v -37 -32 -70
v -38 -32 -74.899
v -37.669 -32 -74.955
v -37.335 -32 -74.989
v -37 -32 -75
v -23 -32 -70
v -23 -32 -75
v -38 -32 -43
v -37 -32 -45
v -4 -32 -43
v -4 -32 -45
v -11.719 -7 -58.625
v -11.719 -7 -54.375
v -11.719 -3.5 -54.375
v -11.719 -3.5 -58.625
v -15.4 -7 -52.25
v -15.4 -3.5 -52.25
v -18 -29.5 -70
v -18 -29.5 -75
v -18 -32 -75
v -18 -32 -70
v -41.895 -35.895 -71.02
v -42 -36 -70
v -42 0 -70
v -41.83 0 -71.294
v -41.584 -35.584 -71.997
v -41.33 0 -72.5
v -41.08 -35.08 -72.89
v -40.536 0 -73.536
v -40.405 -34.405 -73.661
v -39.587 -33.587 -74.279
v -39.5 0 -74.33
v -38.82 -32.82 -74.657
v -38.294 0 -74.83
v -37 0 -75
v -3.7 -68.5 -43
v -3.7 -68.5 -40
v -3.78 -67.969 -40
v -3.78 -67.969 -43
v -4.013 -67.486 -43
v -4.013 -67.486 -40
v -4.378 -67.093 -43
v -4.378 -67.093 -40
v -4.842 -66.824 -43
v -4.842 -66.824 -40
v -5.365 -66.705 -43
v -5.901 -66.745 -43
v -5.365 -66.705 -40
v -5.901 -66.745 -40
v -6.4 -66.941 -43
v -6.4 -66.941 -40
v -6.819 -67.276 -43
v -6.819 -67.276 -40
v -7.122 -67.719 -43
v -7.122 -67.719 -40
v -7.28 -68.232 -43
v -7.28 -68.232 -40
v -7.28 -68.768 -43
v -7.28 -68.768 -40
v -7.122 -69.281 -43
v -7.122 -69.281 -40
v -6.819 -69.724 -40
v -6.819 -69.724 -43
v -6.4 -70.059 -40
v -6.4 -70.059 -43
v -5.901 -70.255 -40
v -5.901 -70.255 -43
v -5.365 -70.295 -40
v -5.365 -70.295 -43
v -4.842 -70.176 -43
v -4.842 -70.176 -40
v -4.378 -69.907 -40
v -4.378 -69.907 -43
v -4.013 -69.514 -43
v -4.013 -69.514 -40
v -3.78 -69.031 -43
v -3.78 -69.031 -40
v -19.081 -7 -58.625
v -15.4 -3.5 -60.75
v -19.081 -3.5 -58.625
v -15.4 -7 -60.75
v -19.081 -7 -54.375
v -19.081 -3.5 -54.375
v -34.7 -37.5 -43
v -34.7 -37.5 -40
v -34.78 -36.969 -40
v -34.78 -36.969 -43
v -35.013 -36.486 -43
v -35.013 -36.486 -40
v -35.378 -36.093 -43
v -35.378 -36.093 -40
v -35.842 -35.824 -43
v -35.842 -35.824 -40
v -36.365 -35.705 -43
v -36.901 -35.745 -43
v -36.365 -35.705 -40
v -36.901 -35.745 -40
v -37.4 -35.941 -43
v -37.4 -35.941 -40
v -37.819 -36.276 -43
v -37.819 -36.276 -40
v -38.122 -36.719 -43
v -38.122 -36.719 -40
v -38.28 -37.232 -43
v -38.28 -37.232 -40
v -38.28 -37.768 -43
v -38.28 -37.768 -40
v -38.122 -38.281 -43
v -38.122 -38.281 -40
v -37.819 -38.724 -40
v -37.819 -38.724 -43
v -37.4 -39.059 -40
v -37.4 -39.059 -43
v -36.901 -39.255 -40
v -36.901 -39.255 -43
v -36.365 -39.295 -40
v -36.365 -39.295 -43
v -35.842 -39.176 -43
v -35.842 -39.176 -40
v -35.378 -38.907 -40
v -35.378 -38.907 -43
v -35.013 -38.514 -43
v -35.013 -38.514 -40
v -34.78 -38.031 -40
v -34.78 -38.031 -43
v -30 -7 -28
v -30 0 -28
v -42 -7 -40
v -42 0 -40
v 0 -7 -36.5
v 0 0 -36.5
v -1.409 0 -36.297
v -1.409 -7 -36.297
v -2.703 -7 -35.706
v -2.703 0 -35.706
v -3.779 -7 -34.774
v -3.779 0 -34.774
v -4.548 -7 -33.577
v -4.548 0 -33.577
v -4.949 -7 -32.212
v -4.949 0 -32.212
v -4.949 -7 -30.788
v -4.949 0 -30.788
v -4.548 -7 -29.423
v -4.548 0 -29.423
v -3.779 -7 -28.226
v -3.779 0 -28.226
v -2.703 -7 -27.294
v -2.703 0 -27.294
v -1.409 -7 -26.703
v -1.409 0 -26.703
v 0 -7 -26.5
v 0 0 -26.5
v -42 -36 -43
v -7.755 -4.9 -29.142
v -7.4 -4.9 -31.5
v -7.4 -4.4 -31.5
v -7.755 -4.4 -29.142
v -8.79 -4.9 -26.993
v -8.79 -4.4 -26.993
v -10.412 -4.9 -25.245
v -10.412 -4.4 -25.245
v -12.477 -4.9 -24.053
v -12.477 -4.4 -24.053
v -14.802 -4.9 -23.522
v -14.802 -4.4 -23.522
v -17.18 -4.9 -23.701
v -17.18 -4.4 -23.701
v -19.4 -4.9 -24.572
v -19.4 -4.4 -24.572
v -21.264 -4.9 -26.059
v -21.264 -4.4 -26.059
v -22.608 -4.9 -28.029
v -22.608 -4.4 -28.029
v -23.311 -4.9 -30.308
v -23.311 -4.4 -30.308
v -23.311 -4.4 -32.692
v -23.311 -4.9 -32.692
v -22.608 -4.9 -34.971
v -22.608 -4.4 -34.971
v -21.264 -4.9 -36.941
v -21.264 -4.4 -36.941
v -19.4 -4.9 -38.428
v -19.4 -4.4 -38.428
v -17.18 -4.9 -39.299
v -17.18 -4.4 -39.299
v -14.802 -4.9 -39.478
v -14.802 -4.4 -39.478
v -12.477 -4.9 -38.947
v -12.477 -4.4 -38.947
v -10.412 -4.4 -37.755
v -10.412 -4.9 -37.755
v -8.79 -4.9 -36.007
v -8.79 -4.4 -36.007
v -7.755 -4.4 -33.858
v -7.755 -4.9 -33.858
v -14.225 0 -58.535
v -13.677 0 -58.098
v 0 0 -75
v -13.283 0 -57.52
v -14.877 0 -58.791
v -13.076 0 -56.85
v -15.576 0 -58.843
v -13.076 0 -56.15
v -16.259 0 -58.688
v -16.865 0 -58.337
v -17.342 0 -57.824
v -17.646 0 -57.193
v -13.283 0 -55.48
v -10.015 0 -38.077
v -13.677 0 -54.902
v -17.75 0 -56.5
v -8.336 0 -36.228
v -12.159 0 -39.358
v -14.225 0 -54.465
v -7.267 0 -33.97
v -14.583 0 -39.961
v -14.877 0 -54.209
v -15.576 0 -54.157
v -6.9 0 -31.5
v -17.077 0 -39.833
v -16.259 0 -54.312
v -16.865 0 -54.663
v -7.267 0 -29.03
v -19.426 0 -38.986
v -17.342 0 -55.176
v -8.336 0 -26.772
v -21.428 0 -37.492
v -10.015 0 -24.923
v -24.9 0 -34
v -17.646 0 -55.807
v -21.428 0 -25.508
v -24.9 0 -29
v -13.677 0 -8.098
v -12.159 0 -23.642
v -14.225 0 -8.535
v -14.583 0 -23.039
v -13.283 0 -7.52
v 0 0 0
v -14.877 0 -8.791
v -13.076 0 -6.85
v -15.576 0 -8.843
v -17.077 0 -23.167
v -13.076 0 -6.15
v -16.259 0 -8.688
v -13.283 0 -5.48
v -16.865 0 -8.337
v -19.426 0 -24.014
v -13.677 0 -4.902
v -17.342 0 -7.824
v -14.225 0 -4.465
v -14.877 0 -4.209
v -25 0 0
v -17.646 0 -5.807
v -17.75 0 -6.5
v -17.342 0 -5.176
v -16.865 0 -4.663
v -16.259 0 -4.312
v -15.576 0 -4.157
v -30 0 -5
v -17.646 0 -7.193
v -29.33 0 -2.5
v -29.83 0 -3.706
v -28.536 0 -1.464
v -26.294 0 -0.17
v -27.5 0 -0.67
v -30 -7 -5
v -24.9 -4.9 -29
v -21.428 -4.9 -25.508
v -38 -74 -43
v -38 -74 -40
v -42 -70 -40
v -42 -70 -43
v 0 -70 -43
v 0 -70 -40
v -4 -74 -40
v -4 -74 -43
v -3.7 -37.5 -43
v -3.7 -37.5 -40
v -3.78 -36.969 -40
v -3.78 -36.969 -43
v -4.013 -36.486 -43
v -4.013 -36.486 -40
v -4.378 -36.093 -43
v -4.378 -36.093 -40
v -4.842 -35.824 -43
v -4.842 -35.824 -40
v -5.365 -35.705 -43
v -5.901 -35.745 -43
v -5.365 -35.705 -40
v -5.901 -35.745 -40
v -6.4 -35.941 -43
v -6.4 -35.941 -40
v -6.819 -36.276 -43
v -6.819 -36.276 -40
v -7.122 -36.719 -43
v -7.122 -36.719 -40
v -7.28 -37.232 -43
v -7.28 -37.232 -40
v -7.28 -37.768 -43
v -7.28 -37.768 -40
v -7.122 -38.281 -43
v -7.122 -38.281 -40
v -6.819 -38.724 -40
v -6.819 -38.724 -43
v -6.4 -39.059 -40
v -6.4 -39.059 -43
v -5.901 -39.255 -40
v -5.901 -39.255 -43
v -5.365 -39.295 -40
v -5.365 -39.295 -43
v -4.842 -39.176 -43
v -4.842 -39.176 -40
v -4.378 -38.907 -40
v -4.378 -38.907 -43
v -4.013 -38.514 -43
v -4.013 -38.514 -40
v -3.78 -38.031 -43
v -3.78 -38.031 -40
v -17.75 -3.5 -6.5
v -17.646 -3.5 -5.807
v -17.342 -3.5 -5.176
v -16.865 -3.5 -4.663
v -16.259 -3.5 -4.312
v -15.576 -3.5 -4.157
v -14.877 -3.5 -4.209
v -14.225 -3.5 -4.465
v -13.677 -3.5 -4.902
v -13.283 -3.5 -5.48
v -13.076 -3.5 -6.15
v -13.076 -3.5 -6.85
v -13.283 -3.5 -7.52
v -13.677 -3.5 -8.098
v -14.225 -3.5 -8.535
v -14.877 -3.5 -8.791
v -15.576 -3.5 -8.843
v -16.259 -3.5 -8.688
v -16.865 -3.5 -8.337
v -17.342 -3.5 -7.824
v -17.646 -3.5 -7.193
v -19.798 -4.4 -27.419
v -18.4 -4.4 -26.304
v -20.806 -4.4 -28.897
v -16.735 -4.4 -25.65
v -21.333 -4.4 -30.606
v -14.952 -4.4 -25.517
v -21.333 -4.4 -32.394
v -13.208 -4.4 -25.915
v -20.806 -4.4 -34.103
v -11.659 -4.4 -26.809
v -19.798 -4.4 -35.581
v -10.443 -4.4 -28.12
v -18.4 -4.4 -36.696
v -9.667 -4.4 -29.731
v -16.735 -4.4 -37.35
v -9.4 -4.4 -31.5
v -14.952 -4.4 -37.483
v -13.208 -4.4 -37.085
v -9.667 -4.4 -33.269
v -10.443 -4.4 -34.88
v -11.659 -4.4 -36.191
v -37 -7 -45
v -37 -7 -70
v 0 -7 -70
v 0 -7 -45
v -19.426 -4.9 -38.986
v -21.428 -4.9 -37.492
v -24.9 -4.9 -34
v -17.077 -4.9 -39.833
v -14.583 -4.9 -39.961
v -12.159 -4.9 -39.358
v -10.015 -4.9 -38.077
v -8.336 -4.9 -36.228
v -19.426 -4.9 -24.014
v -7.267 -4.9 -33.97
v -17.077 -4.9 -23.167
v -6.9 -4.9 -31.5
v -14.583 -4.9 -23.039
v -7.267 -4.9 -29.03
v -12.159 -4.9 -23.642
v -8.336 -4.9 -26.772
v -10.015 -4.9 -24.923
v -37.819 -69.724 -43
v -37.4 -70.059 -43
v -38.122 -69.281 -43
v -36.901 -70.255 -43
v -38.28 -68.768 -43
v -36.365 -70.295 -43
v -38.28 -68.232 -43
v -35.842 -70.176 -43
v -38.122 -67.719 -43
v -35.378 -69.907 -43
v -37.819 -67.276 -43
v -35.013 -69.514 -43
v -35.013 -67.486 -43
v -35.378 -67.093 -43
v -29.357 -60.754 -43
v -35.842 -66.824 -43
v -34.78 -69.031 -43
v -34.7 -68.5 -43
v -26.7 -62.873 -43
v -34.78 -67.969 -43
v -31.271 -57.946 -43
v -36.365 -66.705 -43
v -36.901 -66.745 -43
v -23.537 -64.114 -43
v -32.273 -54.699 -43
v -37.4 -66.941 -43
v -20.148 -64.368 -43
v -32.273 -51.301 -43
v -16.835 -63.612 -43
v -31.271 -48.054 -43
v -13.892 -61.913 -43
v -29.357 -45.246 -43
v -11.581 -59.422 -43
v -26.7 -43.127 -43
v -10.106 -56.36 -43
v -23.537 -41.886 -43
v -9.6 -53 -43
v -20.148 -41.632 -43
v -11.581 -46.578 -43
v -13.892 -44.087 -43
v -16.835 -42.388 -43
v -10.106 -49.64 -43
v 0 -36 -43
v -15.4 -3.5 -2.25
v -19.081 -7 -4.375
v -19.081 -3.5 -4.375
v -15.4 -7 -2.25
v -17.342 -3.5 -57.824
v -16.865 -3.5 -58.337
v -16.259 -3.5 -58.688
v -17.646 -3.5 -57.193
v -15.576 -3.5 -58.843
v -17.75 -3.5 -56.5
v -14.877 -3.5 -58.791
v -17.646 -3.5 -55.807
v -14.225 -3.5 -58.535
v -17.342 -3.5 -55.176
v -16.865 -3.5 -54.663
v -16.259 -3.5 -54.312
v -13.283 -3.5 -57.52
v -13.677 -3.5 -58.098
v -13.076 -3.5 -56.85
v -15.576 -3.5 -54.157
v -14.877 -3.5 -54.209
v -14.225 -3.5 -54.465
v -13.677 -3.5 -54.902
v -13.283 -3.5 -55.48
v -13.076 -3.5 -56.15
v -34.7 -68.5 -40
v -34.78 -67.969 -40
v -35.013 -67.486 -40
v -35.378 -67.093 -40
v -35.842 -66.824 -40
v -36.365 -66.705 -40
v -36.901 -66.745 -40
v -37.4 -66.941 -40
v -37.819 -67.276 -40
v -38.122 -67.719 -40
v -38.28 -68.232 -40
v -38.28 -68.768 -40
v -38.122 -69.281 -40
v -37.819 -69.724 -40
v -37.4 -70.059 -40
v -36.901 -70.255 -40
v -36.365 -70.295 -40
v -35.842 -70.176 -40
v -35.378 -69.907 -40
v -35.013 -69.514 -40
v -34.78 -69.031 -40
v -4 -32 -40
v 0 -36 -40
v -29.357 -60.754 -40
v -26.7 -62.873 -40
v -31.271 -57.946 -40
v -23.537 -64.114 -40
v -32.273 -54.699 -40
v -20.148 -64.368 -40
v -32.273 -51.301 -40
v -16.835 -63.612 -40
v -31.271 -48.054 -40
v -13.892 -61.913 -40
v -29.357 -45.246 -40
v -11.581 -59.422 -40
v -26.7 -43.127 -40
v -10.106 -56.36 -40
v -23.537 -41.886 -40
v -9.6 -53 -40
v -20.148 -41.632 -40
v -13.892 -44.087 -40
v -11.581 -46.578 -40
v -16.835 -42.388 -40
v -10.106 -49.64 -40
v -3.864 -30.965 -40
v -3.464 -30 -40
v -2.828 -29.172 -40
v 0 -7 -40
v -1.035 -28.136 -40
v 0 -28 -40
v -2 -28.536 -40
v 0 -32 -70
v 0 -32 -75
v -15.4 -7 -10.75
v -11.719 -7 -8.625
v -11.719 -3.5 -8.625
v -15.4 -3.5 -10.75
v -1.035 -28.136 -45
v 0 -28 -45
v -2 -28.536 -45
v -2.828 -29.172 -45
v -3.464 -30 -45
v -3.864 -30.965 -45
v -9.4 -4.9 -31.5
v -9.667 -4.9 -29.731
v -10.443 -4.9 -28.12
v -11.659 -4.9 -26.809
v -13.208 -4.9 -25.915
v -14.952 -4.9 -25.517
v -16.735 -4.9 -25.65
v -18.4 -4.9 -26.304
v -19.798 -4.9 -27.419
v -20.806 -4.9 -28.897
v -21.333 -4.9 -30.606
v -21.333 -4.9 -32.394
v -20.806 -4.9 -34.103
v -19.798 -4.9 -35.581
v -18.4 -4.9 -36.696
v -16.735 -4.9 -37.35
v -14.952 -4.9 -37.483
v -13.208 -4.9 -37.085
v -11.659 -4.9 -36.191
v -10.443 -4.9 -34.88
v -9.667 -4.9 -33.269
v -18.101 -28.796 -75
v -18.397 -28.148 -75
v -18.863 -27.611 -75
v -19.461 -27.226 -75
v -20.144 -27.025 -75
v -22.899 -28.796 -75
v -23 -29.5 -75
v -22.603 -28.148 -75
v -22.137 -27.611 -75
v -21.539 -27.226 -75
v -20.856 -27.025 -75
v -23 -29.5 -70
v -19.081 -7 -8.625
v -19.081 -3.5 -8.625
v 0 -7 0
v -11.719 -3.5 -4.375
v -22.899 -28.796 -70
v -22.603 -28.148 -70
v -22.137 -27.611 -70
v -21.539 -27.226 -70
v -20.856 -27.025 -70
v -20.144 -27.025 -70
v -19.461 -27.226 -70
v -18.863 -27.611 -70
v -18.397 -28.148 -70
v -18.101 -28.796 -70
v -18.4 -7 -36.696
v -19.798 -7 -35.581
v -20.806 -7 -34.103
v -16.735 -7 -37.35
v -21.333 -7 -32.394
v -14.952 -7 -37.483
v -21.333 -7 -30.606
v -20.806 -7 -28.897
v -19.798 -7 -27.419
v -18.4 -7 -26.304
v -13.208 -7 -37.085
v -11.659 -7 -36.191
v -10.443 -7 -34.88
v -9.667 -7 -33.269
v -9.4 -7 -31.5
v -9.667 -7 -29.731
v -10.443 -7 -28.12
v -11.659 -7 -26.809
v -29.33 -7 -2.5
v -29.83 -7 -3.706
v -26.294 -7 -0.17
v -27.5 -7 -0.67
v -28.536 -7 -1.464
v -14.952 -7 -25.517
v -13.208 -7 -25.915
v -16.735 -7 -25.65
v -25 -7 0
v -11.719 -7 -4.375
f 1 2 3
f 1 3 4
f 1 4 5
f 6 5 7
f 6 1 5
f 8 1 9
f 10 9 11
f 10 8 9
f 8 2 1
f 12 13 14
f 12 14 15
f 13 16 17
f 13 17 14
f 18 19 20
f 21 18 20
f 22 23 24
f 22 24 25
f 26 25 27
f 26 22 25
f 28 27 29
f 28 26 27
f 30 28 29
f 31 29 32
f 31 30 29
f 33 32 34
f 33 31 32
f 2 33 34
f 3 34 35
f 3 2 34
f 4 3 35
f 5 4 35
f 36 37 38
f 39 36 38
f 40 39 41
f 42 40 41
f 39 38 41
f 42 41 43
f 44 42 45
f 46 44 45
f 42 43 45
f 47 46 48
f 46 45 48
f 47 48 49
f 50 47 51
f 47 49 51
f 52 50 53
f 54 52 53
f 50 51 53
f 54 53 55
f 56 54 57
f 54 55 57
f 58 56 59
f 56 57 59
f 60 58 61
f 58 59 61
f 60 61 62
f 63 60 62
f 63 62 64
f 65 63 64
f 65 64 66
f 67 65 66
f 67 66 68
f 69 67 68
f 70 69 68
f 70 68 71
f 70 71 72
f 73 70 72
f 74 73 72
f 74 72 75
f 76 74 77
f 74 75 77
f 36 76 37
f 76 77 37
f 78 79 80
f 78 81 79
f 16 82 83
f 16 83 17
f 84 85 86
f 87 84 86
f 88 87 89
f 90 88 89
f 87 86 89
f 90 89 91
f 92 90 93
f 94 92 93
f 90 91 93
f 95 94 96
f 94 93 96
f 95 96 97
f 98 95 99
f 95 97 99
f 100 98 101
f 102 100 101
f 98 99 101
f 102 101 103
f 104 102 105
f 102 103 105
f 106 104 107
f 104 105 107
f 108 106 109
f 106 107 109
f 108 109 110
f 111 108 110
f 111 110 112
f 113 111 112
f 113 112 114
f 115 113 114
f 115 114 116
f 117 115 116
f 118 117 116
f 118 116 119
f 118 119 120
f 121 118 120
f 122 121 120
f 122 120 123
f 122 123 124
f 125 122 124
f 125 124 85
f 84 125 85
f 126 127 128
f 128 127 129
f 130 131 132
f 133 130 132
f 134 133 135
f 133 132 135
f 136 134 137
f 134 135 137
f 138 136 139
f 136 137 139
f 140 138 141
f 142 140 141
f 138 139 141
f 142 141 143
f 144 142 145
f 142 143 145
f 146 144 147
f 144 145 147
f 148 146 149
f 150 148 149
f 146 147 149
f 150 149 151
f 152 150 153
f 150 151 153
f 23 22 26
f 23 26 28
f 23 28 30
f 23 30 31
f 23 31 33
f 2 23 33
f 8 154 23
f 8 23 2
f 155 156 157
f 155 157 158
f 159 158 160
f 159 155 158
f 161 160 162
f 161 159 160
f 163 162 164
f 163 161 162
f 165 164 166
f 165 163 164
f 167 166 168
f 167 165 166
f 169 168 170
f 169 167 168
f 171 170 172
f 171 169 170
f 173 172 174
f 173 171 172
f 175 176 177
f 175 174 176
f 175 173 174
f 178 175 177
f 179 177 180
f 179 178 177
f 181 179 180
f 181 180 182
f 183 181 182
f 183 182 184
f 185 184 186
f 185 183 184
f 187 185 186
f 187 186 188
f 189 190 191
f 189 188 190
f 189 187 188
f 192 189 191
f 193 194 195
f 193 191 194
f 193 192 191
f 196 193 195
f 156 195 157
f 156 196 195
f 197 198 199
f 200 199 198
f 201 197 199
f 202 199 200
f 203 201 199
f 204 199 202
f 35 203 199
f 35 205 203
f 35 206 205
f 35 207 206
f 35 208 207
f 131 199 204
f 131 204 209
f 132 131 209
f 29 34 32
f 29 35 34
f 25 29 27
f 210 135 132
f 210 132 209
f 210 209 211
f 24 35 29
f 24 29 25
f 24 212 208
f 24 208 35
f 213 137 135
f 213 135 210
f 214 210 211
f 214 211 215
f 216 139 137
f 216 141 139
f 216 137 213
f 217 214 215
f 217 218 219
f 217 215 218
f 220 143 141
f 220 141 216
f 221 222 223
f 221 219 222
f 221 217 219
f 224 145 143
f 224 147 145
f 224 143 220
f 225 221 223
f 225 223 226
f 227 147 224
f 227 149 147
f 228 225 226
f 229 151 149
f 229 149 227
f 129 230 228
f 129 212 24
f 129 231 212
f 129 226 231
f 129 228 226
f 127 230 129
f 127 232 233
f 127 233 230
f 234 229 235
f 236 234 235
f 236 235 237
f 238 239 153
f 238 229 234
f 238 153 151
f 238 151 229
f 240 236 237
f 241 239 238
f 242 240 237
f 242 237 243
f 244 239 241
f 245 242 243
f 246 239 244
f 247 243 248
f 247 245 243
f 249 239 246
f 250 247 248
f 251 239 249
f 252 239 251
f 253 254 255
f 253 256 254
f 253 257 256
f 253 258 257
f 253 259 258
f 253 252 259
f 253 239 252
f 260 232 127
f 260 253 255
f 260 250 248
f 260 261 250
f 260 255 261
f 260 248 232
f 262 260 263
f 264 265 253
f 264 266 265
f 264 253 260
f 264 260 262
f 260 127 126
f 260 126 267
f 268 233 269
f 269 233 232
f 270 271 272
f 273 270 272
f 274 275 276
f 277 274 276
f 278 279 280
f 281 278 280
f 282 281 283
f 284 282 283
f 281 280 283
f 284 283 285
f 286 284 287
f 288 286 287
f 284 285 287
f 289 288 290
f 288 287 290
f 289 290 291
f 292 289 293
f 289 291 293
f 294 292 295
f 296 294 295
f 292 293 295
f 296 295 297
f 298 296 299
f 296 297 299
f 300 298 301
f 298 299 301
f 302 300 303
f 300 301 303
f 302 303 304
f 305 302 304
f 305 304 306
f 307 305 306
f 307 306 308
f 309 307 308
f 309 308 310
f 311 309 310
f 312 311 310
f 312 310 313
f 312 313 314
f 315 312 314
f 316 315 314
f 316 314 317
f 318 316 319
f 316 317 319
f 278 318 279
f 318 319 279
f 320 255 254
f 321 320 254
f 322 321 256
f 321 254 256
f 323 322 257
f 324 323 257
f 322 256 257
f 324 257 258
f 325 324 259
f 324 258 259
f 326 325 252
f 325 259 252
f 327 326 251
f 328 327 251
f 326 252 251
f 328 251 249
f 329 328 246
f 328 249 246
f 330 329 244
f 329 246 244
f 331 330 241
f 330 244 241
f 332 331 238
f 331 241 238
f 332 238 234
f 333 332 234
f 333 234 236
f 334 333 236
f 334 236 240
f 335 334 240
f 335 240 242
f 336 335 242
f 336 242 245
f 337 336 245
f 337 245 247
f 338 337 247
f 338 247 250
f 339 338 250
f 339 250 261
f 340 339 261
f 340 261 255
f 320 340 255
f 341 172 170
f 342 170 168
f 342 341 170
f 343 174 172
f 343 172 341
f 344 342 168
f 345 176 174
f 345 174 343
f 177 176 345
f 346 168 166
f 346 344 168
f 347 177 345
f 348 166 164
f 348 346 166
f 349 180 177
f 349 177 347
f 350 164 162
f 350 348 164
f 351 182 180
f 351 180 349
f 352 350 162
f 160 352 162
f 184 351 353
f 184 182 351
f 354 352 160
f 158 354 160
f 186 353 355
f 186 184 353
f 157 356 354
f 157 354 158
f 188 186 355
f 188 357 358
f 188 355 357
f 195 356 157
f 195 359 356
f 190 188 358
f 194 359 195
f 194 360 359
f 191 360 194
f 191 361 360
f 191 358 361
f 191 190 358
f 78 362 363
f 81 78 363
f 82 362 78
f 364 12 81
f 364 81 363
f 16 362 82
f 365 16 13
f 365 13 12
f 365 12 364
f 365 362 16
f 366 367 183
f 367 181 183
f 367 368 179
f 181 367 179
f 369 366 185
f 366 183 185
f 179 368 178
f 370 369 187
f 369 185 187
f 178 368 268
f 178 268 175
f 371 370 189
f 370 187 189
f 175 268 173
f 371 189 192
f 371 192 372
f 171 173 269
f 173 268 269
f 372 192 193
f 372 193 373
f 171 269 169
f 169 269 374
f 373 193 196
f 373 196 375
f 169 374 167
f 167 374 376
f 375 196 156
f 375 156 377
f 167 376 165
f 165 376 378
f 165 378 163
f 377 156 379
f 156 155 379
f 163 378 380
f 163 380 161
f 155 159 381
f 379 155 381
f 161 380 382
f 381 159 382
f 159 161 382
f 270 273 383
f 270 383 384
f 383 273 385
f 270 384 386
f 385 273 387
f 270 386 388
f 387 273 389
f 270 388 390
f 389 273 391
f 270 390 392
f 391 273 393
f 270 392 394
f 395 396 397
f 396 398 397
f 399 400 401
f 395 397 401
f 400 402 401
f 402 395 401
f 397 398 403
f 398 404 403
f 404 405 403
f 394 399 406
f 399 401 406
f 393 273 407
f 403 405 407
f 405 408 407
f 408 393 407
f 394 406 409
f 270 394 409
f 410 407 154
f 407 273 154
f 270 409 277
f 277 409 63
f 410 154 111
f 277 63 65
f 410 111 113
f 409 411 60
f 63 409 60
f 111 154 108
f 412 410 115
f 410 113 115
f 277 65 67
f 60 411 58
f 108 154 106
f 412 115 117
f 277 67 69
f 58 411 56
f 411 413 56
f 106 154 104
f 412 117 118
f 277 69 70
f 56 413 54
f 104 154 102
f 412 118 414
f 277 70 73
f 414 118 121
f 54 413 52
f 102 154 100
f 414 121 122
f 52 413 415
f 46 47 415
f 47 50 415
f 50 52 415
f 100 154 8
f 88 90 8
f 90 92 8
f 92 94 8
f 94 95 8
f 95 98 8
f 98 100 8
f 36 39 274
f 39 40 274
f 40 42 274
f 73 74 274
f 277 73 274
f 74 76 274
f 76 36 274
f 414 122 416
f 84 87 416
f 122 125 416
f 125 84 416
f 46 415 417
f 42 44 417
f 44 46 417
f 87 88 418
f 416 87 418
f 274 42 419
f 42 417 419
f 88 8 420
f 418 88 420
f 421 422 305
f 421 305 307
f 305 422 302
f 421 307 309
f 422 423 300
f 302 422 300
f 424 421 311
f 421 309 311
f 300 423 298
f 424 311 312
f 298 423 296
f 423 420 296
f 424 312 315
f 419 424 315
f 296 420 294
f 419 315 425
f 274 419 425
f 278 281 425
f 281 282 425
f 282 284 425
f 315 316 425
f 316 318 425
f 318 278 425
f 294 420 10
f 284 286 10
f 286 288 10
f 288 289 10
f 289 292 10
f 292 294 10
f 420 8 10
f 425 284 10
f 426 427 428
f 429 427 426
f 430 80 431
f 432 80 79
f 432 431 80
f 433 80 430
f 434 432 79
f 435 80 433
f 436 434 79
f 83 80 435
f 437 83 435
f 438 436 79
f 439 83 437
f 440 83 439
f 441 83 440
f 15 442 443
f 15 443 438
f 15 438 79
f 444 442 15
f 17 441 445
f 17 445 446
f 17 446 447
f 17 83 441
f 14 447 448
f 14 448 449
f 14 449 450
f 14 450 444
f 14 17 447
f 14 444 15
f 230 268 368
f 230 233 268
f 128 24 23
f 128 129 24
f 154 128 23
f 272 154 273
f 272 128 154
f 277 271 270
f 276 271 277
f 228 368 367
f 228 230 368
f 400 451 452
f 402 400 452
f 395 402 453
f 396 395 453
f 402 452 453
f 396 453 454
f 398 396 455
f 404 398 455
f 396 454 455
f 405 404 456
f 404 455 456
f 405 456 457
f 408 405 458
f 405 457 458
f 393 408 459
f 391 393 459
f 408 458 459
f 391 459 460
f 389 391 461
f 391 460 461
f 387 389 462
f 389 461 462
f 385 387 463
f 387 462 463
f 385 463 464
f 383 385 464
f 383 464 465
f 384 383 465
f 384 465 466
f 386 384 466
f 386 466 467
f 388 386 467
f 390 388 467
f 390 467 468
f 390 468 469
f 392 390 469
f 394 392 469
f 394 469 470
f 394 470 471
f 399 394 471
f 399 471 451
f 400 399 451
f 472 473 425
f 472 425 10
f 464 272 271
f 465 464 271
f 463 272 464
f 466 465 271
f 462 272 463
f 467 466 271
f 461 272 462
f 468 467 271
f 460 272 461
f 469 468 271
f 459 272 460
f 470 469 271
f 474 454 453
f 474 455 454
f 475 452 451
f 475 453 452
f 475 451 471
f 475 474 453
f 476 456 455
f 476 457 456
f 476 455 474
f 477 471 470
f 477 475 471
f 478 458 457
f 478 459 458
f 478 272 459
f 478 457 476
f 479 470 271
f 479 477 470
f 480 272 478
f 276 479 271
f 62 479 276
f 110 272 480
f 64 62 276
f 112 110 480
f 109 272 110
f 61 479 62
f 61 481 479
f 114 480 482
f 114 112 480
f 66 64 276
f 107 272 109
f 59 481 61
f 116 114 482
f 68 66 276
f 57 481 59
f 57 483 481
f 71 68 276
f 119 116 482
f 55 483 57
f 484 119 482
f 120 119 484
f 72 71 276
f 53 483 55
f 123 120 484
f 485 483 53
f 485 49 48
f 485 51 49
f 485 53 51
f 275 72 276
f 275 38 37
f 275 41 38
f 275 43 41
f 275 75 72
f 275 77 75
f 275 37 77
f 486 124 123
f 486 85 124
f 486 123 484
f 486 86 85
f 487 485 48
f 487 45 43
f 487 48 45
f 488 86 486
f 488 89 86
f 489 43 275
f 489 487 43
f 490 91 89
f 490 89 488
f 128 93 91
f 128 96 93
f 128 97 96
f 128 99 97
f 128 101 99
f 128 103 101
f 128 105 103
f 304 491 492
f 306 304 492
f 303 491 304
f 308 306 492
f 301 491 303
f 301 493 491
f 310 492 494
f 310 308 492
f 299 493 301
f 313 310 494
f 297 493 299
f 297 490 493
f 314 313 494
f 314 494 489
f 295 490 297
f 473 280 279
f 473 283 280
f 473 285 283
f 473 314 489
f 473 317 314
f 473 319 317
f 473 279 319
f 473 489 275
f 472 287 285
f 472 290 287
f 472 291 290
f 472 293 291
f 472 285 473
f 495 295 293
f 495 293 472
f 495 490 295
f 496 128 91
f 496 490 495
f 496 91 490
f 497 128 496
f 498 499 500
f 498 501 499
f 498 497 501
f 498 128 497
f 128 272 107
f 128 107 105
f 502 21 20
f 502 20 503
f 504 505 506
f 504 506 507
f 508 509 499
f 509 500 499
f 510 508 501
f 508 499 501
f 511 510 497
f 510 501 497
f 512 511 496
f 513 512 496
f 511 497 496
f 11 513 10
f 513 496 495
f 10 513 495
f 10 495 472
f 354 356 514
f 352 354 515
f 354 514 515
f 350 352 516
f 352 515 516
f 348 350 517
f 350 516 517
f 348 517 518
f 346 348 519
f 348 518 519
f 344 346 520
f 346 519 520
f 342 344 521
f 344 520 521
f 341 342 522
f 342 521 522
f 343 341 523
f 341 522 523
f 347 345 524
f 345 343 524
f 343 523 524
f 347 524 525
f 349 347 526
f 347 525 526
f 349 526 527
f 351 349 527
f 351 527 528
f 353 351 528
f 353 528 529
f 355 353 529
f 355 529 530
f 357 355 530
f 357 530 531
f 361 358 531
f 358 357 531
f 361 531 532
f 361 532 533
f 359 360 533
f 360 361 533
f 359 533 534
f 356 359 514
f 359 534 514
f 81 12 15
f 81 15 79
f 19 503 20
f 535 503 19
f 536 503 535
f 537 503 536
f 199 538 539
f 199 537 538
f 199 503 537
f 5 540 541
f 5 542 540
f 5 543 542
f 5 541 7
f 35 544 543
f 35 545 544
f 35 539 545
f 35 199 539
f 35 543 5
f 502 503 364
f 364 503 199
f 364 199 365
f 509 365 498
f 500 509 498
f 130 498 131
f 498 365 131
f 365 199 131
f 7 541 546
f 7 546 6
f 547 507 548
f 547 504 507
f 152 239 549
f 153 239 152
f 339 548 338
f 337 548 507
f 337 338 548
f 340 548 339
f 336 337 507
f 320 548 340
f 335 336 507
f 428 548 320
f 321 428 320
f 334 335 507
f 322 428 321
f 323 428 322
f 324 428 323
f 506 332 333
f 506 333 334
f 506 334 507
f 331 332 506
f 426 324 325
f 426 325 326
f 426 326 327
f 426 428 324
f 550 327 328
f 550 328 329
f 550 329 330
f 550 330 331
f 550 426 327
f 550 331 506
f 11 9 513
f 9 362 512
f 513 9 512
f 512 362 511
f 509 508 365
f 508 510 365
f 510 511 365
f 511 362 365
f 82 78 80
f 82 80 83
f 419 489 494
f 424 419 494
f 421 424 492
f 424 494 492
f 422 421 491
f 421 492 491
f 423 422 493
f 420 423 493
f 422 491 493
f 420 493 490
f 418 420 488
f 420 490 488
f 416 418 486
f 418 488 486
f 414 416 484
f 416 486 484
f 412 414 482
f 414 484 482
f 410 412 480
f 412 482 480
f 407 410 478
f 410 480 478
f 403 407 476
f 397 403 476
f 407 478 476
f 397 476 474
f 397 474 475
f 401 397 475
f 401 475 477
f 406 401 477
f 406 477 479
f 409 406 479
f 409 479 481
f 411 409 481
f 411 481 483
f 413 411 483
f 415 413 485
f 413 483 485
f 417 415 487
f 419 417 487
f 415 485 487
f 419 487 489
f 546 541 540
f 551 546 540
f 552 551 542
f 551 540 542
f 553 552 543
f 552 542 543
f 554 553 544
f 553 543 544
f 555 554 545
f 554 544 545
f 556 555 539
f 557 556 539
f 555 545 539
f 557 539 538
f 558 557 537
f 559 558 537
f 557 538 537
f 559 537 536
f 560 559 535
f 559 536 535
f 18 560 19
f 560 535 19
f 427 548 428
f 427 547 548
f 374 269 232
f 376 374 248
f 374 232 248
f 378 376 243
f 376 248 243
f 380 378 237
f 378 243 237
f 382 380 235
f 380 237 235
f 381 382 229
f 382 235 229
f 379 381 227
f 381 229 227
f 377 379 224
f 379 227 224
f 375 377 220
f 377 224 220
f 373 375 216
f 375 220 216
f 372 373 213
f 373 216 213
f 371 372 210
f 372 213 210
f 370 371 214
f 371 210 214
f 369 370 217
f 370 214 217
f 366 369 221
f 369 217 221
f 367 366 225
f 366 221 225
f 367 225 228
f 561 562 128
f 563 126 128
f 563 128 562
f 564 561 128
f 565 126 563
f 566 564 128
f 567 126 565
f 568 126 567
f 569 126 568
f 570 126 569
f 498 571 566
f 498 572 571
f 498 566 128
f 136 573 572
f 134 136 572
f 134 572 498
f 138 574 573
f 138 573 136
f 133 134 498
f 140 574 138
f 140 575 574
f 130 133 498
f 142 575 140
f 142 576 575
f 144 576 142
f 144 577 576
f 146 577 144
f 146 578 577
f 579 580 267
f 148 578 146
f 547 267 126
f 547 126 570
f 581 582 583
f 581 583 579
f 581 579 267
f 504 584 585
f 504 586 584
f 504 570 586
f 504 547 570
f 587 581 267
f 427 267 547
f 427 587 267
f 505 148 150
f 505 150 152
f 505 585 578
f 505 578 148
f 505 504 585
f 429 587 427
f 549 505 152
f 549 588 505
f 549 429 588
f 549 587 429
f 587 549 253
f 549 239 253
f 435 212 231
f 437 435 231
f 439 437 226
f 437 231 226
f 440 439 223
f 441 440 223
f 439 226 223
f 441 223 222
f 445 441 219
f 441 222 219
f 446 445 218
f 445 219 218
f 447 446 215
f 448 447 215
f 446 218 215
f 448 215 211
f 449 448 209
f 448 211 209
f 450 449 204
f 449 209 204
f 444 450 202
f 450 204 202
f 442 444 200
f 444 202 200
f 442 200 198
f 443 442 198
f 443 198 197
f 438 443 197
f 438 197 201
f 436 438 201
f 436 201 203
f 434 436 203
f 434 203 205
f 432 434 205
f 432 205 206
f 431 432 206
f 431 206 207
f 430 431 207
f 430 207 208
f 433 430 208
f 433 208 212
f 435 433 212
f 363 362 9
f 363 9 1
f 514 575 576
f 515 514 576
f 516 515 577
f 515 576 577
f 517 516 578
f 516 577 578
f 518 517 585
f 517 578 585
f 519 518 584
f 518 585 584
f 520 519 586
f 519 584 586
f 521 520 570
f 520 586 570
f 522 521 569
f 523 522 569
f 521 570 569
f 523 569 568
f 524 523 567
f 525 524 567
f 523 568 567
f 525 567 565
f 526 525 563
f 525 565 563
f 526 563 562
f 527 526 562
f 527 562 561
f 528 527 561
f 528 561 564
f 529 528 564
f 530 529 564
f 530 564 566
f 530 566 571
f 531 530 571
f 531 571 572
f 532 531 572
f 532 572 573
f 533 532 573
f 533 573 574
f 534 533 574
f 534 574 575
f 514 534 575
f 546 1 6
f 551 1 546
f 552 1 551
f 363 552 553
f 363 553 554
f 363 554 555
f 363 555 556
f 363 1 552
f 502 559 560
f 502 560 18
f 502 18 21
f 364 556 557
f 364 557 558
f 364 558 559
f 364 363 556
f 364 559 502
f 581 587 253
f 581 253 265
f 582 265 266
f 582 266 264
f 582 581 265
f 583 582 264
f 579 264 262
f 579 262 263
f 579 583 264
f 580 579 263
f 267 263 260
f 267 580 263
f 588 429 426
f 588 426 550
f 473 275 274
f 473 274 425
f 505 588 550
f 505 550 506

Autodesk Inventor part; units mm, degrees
ref_plane "YZ Plane" through (0, 0, 0) normal (1, 0, 0) x (0, 1, 0)
ref_plane "XZ Plane" through (0, 0, 0) normal (0, 1, 0) x (-1, 0, 0)
ref_plane "XY Plane" through (0, 0, 0) normal (0, 0, 1) x (1, 0, 0)
sketch "Sketch1" plane through (0, 0, 0) normal (0, 1, 0) x (-1, 0, 0)
  line L0 (30, 0) -> (30, -75) construction
  line L1 (30, -75) -> (0, -75) construction
  line L2 (0, -75) -> (0, 0) construction
  line L3 (0, 0) -> (15.4, 0) construction
  line L4 (15.4, 0) -> (15.4, -6.5) construction
  line L5 (15.4, -6.5) -> (0, -6.5) construction
  line L6 (0, -6.5) -> (0, 0) construction
  line L7 (15.4, -6.5) -> (15.4, -31.5) construction
  circle A0 centre (15.4, -31.5) radius 8.5 construction
  line L8 (15.4, -31.5) -> (15.4, -56.5) construction
  circle A1 centre (15.4, -6.5) radius 2.35
  circle A2 centre (15.4, -56.5) radius 2.35
  line L9 (15.4, -23) -> (24.9, -23) construction
  line L10 (24.9, -23) -> (24.9, -40) construction
  line L11 (24.9, -40) -> (15.4, -40) construction
  line L12 (15.4, -40) -> (15.4, -23) construction
  line L13 (5.9, -29) -> (24.9, -29) construction
  line L14 (24.9, -29) -> (24.9, -34) construction
  line L15 (24.9, -34) -> (5.9, -34) construction
  line L16 (5.9, -34) -> (5.9, -29) construction
  line L17 (5.9, -29) -> (24.9, -34) construction
  line L18 (24.9, -29) -> (5.9, -34) construction
  line L19 (24.9, -29) -> (24.9, -34)
  line L20 (24.9, -29) -> (21.4283, -25.5075)
  line L21 (24.9, -34) -> (21.4283, -37.4925)
  arc A3 (21.4283, -25.5075) -> (21.4283, -37.4925) centre (15.4, -31.5) ccw
  arc A4 (0, -36.5) -> (0, -26.5) centre (0, -31.5) ccw
  line L22 (0, 0) -> (0, -26.5)
  line L23 (0, -36.5) -> (0, -75)
  line L24 (42, -40) -> (0, -40) construction
  line L25 (0, -40) -> (0, -75) construction
  line L26 (42, -40) -> (30, -40) construction
  line L27 (30, -40) -> (30, -28) construction
  line L28 (30, -28) -> (42, -28) construction
  line L29 (42, -28) -> (42, -40) construction
  line L30 (30, -28) -> (42, -40)
  line L31 (0, 0) -> (30, 0)
  line L32 (30, -28) -> (30, 0)
  line L33 (42, -40) -> (42, -75)
  line L34 (42, -75) -> (0, -75)
  dimension "d0" = 30
  dimension "d1" = 75
  dimension "d2" = 15.4
  dimension "d3" = 6.5
  dimension "d4" = 25
  dimension "d5" = 17
  dimension "d6" = 25
  dimension "d7" = 4.7
  dimension "d8" = 4.7
  dimension "d9" = 9.5
  dimension "d10" = 5
  dimension "d11" = 5
  dimension "d12" = 42
  dimension "d13" = 35
  dimension "d14" = 12
extrude "Extrusion1" add sketch "Sketch1" against normal blind 7
sketch "Sketch2" plane through (0, -7, 0) normal (0, -1, 0) x (1, 0, 0)
  circle A0 centre (-15.4, -6.5) radius 2.35 construction
  circle A1 centre (-15.4, -56.5) radius 2.35 construction
  line L0 (-15.4, -6.5) -> (-15.4, -10.75) construction
  line L1 (-15.4, -56.5) -> (-15.4, -52.25) construction
  line L2 (-15.4, -10.75) -> (-19.0806, -8.625)
  line L3 (-19.0806, -8.625) -> (-19.0806, -4.375)
  line L4 (-19.0806, -4.375) -> (-15.4, -2.25)
  line L5 (-15.4, -2.25) -> (-11.7194, -4.375)
  line L6 (-11.7194, -4.375) -> (-11.7194, -8.625)
  line L7 (-11.7194, -8.625) -> (-15.4, -10.75)
  line L8 (-15.4, -52.25) -> (-11.7194, -54.375)
  line L9 (-11.7194, -54.375) -> (-11.7194, -58.625)
  line L10 (-11.7194, -58.625) -> (-15.4, -60.75)
  line L11 (-15.4, -60.75) -> (-19.0806, -58.625)
  line L12 (-19.0806, -58.625) -> (-19.0806, -54.375)
  line L13 (-19.0806, -54.375) -> (-15.4, -52.25)
  point P0 (0, 0)
  dimension "d18" = 4.25
  dimension "d19" = 4.25
extrude "Extrusion2" cut sketch "Sketch2" against normal blind 3.5
sketch "Sketch3" plane through (0, -7, 0) normal (0, -1, 0) x (1, 0, 0)
  arc A0 (-21.4283, -37.4925) -> (-21.4283, -25.5075) centre (-15.4, -31.5) ccw projected
  circle A1 centre (-15.4, -31.5) radius 6
  line L0 (-24.9, -29) -> (-21.4283, -25.5075) projected
  line L1 (-24.9, -34) -> (-24.9, -29) projected
  line L2 (-21.4283, -37.4925) -> (-24.9, -34) projected
  point P0 (0, 0)
  dimension "d22" = 12
extrude "Extrusion3" add sketch "Sketch3" against normal blind 2.1
sketch "Sketch4" plane through (0, -4.9, 0) normal (0, 1, 0) x (1, 0, 0)
  circle A0 centre (-15.4, 31.5) radius 6 projected
  circle A1 centre (-15.4, 31.5) radius 8
  point P0 (0, 0)
  dimension "d25" = 16
extrude "Extrusion4" add sketch "Sketch4" along normal blind 0.5
sketch "Sketch5" plane through (0, -7, 0) normal (0, -1, 0) x (1, 0, 0)
  line L0 (0, -75) -> (0, -36.5) construction
  line L1 (-42, -70) -> (-42, -40) construction
  line L2 (0, -75) -> (-42, -75) construction
  line L3 (-42, -75) -> (-42, -40) construction
  line L4 (-42, -40) -> (0, -40) construction
  line L5 (0, -40) -> (0, -75) construction
  line L6 (0, -40) -> (-42, -40) construction
  line L7 (-42, -40) -> (-42, -45) construction
  line L8 (-42, -45) -> (0, -45) construction
  line L9 (0, -45) -> (0, -40) construction
  line L10 (-42, -40) -> (-37, -40) construction
  line L11 (-37, -40) -> (-37, -75) construction
  line L12 (-37, -75) -> (-42, -75) construction
  line L13 (-42, -75) -> (-42, -40) construction
  line L14 (-42, -75) -> (0, -75) construction
  line L15 (0, -75) -> (0, -70) construction
  line L16 (0, -70) -> (-42, -70) construction
  line L17 (-42, -70) -> (-42, -75) construction
  line L18 (-37, -75) -> (0, -75) projected
  line L19 (0, -75) -> (0, -70)
  line L20 (-37, -70) -> (0, -70)
  line L21 (-37, -45) -> (-37, -70)
  line L22 (0, -40) -> (-42, -40)
  line L23 (0, -45) -> (0, -40)
  line L24 (-37, -45) -> (0, -45)
  line L25 (-42, -40) -> (-42, -75) projected
  line L26 (-42, -40) -> (-42, -75)
  line L27 (-42, -75) -> (0, -75)
  point P0 (0, 0)
  dimension "d28" = 5
  dimension "d29" = 5
extrude "Extrusion5" add sketch "Sketch5" along normal blind 25
sketch "Sketch6" plane through (-42, -7, -40) normal (0, 0, 1) x (1, 0, 0)
  line L0 (5, -25) -> (42, -25) projected
  line L1 (38, -25) -> (0, -25)
  line L2 (0, -25) -> (0, -63)
  line L3 (4, -67) -> (38, -67)
  line L4 (42, -63) -> (42, -29)
  line L5 (42, -63) -> (38, -67)
  line L6 (4, -67) -> (0, -63)
  line L7 (42, -29) -> (38, -25)
  circle A0 centre (21, -46) radius 11.4
  line L8 (36.5, -61.5) -> (5.5, -61.5) construction
  line L9 (5.5, -61.5) -> (5.5, -30.5) construction
  line L10 (5.5, -30.5) -> (36.5, -30.5) construction
  line L11 (36.5, -30.5) -> (36.5, -61.5) construction
  line L12 (36.5, -61.5) -> (5.5, -30.5) construction
  line L13 (5.5, -61.5) -> (36.5, -30.5) construction
  circle A1 centre (36.5, -61.5) radius 1.8
  circle A2 centre (5.5, -61.5) radius 1.8
  circle A3 centre (5.5, -30.5) radius 1.8
  circle A4 centre (36.5, -30.5) radius 1.8
  point P0 (42, 7)
  point P1 (0, -67)
  point P2 (42, -67)
  dimension "d32" = 42
  dimension "d33" = 42
  dimension "d34" = 4
  dimension "d35" = 4
  dimension "d36" = 4
  dimension "d37" = 4
  dimension "d38" = 4
  dimension "d39" = 4
  dimension "d40" = 22.8
  dimension "d41" = 31
  dimension "d42" = 31
  dimension "d43" = 3.6
  dimension "d44" = 3.6
  dimension "d45" = 3.6
  dimension "d46" = 3.6
extrude "Extrusion6" add sketch "Sketch6" against normal blind 3
sketch "Sketch7" plane through (-42, -7, -40) normal (0, 0, 1) x (1, 0, 0)
  line L0 (42, -25) -> (38, -25) projected
  arc A0 (42, -21) -> (38, -25) centre (42, -25) ccw
  line L1 (42, -21) -> (42, -25)
  point P0 (42, 7)
extrude "Extrusion7" cut sketch "Sketch7" against normal blind 5
sketch "Sketch8" plane through (0, 0, -75) normal (0, 0, -1) x (-1, 0, 0)
  line L0 (42, -32) -> (0, -32) construction
  line L1 (20.5, -34.5) -> (20.5, -29.5) construction
  line L2 (37, -32) -> (4, -32) construction
  line L3 (23, -34.5) -> (23, -29.5) construction
  line L4 (18, -29.5) -> (18, -34.5) construction
  arc A0 (18, -34.5) -> (23, -34.5) centre (20.5, -34.5) ccw construction
  arc A1 (23, -29.5) -> (18, -29.5) centre (20.5, -29.5) ccw construction
  line L5 (20.5, -32) -> (25.5, -32) construction
  arc A2 (23, -29.5) -> (18, -29.5) centre (20.5, -29.5) ccw
  line L6 (23, -29.5) -> (23, -32)
  line L7 (18, -29.5) -> (18, -32)
  line L8 (18, -32) -> (23, -32)
  point P0 (0, 0)
  dimension "d51" = 2.5
  dimension "d52" = 90
  dimension "d53" = 5
extrude "Extrusion8" cut sketch "Sketch8" against normal blind 5
sketch "Sketch9" plane through (-42, -7, -43) normal (0, 0, -1) x (-1, 0, 0)
  line L0 (0, -25) -> (-19, -25) construction
  line L1 (0, -25) -> (-4, -25) construction
  line L2 (-4, -25) -> (-4, -29) construction
  line L3 (-4, -29) -> (0, -29) construction
  line L4 (0, -29) -> (0, -25) construction
  line L5 (0, -29) -> (-4, -25)
  line L6 (0, -25) -> (-4, -25)
  line L7 (0, -25) -> (0, -29)
  line L8 (0, 0) -> (0, -63) projected
  point P0 (-42, 7)
  dimension "d56" = 4
  dimension "d57" = 4
extrude "Extrusion9" add sketch "Sketch9" along normal up to surface (32 mm away)
fillet "Fillet1" radius 5 2 edges at (-30, -3.5, 0) (-42, -18, -75)
equation "\"d35\" = d34"
equation "\"d36\" = d34"
equation "\"d37\" = d36"
equation "\"d38\" = d34"
equation "\"d39\" = d38"
